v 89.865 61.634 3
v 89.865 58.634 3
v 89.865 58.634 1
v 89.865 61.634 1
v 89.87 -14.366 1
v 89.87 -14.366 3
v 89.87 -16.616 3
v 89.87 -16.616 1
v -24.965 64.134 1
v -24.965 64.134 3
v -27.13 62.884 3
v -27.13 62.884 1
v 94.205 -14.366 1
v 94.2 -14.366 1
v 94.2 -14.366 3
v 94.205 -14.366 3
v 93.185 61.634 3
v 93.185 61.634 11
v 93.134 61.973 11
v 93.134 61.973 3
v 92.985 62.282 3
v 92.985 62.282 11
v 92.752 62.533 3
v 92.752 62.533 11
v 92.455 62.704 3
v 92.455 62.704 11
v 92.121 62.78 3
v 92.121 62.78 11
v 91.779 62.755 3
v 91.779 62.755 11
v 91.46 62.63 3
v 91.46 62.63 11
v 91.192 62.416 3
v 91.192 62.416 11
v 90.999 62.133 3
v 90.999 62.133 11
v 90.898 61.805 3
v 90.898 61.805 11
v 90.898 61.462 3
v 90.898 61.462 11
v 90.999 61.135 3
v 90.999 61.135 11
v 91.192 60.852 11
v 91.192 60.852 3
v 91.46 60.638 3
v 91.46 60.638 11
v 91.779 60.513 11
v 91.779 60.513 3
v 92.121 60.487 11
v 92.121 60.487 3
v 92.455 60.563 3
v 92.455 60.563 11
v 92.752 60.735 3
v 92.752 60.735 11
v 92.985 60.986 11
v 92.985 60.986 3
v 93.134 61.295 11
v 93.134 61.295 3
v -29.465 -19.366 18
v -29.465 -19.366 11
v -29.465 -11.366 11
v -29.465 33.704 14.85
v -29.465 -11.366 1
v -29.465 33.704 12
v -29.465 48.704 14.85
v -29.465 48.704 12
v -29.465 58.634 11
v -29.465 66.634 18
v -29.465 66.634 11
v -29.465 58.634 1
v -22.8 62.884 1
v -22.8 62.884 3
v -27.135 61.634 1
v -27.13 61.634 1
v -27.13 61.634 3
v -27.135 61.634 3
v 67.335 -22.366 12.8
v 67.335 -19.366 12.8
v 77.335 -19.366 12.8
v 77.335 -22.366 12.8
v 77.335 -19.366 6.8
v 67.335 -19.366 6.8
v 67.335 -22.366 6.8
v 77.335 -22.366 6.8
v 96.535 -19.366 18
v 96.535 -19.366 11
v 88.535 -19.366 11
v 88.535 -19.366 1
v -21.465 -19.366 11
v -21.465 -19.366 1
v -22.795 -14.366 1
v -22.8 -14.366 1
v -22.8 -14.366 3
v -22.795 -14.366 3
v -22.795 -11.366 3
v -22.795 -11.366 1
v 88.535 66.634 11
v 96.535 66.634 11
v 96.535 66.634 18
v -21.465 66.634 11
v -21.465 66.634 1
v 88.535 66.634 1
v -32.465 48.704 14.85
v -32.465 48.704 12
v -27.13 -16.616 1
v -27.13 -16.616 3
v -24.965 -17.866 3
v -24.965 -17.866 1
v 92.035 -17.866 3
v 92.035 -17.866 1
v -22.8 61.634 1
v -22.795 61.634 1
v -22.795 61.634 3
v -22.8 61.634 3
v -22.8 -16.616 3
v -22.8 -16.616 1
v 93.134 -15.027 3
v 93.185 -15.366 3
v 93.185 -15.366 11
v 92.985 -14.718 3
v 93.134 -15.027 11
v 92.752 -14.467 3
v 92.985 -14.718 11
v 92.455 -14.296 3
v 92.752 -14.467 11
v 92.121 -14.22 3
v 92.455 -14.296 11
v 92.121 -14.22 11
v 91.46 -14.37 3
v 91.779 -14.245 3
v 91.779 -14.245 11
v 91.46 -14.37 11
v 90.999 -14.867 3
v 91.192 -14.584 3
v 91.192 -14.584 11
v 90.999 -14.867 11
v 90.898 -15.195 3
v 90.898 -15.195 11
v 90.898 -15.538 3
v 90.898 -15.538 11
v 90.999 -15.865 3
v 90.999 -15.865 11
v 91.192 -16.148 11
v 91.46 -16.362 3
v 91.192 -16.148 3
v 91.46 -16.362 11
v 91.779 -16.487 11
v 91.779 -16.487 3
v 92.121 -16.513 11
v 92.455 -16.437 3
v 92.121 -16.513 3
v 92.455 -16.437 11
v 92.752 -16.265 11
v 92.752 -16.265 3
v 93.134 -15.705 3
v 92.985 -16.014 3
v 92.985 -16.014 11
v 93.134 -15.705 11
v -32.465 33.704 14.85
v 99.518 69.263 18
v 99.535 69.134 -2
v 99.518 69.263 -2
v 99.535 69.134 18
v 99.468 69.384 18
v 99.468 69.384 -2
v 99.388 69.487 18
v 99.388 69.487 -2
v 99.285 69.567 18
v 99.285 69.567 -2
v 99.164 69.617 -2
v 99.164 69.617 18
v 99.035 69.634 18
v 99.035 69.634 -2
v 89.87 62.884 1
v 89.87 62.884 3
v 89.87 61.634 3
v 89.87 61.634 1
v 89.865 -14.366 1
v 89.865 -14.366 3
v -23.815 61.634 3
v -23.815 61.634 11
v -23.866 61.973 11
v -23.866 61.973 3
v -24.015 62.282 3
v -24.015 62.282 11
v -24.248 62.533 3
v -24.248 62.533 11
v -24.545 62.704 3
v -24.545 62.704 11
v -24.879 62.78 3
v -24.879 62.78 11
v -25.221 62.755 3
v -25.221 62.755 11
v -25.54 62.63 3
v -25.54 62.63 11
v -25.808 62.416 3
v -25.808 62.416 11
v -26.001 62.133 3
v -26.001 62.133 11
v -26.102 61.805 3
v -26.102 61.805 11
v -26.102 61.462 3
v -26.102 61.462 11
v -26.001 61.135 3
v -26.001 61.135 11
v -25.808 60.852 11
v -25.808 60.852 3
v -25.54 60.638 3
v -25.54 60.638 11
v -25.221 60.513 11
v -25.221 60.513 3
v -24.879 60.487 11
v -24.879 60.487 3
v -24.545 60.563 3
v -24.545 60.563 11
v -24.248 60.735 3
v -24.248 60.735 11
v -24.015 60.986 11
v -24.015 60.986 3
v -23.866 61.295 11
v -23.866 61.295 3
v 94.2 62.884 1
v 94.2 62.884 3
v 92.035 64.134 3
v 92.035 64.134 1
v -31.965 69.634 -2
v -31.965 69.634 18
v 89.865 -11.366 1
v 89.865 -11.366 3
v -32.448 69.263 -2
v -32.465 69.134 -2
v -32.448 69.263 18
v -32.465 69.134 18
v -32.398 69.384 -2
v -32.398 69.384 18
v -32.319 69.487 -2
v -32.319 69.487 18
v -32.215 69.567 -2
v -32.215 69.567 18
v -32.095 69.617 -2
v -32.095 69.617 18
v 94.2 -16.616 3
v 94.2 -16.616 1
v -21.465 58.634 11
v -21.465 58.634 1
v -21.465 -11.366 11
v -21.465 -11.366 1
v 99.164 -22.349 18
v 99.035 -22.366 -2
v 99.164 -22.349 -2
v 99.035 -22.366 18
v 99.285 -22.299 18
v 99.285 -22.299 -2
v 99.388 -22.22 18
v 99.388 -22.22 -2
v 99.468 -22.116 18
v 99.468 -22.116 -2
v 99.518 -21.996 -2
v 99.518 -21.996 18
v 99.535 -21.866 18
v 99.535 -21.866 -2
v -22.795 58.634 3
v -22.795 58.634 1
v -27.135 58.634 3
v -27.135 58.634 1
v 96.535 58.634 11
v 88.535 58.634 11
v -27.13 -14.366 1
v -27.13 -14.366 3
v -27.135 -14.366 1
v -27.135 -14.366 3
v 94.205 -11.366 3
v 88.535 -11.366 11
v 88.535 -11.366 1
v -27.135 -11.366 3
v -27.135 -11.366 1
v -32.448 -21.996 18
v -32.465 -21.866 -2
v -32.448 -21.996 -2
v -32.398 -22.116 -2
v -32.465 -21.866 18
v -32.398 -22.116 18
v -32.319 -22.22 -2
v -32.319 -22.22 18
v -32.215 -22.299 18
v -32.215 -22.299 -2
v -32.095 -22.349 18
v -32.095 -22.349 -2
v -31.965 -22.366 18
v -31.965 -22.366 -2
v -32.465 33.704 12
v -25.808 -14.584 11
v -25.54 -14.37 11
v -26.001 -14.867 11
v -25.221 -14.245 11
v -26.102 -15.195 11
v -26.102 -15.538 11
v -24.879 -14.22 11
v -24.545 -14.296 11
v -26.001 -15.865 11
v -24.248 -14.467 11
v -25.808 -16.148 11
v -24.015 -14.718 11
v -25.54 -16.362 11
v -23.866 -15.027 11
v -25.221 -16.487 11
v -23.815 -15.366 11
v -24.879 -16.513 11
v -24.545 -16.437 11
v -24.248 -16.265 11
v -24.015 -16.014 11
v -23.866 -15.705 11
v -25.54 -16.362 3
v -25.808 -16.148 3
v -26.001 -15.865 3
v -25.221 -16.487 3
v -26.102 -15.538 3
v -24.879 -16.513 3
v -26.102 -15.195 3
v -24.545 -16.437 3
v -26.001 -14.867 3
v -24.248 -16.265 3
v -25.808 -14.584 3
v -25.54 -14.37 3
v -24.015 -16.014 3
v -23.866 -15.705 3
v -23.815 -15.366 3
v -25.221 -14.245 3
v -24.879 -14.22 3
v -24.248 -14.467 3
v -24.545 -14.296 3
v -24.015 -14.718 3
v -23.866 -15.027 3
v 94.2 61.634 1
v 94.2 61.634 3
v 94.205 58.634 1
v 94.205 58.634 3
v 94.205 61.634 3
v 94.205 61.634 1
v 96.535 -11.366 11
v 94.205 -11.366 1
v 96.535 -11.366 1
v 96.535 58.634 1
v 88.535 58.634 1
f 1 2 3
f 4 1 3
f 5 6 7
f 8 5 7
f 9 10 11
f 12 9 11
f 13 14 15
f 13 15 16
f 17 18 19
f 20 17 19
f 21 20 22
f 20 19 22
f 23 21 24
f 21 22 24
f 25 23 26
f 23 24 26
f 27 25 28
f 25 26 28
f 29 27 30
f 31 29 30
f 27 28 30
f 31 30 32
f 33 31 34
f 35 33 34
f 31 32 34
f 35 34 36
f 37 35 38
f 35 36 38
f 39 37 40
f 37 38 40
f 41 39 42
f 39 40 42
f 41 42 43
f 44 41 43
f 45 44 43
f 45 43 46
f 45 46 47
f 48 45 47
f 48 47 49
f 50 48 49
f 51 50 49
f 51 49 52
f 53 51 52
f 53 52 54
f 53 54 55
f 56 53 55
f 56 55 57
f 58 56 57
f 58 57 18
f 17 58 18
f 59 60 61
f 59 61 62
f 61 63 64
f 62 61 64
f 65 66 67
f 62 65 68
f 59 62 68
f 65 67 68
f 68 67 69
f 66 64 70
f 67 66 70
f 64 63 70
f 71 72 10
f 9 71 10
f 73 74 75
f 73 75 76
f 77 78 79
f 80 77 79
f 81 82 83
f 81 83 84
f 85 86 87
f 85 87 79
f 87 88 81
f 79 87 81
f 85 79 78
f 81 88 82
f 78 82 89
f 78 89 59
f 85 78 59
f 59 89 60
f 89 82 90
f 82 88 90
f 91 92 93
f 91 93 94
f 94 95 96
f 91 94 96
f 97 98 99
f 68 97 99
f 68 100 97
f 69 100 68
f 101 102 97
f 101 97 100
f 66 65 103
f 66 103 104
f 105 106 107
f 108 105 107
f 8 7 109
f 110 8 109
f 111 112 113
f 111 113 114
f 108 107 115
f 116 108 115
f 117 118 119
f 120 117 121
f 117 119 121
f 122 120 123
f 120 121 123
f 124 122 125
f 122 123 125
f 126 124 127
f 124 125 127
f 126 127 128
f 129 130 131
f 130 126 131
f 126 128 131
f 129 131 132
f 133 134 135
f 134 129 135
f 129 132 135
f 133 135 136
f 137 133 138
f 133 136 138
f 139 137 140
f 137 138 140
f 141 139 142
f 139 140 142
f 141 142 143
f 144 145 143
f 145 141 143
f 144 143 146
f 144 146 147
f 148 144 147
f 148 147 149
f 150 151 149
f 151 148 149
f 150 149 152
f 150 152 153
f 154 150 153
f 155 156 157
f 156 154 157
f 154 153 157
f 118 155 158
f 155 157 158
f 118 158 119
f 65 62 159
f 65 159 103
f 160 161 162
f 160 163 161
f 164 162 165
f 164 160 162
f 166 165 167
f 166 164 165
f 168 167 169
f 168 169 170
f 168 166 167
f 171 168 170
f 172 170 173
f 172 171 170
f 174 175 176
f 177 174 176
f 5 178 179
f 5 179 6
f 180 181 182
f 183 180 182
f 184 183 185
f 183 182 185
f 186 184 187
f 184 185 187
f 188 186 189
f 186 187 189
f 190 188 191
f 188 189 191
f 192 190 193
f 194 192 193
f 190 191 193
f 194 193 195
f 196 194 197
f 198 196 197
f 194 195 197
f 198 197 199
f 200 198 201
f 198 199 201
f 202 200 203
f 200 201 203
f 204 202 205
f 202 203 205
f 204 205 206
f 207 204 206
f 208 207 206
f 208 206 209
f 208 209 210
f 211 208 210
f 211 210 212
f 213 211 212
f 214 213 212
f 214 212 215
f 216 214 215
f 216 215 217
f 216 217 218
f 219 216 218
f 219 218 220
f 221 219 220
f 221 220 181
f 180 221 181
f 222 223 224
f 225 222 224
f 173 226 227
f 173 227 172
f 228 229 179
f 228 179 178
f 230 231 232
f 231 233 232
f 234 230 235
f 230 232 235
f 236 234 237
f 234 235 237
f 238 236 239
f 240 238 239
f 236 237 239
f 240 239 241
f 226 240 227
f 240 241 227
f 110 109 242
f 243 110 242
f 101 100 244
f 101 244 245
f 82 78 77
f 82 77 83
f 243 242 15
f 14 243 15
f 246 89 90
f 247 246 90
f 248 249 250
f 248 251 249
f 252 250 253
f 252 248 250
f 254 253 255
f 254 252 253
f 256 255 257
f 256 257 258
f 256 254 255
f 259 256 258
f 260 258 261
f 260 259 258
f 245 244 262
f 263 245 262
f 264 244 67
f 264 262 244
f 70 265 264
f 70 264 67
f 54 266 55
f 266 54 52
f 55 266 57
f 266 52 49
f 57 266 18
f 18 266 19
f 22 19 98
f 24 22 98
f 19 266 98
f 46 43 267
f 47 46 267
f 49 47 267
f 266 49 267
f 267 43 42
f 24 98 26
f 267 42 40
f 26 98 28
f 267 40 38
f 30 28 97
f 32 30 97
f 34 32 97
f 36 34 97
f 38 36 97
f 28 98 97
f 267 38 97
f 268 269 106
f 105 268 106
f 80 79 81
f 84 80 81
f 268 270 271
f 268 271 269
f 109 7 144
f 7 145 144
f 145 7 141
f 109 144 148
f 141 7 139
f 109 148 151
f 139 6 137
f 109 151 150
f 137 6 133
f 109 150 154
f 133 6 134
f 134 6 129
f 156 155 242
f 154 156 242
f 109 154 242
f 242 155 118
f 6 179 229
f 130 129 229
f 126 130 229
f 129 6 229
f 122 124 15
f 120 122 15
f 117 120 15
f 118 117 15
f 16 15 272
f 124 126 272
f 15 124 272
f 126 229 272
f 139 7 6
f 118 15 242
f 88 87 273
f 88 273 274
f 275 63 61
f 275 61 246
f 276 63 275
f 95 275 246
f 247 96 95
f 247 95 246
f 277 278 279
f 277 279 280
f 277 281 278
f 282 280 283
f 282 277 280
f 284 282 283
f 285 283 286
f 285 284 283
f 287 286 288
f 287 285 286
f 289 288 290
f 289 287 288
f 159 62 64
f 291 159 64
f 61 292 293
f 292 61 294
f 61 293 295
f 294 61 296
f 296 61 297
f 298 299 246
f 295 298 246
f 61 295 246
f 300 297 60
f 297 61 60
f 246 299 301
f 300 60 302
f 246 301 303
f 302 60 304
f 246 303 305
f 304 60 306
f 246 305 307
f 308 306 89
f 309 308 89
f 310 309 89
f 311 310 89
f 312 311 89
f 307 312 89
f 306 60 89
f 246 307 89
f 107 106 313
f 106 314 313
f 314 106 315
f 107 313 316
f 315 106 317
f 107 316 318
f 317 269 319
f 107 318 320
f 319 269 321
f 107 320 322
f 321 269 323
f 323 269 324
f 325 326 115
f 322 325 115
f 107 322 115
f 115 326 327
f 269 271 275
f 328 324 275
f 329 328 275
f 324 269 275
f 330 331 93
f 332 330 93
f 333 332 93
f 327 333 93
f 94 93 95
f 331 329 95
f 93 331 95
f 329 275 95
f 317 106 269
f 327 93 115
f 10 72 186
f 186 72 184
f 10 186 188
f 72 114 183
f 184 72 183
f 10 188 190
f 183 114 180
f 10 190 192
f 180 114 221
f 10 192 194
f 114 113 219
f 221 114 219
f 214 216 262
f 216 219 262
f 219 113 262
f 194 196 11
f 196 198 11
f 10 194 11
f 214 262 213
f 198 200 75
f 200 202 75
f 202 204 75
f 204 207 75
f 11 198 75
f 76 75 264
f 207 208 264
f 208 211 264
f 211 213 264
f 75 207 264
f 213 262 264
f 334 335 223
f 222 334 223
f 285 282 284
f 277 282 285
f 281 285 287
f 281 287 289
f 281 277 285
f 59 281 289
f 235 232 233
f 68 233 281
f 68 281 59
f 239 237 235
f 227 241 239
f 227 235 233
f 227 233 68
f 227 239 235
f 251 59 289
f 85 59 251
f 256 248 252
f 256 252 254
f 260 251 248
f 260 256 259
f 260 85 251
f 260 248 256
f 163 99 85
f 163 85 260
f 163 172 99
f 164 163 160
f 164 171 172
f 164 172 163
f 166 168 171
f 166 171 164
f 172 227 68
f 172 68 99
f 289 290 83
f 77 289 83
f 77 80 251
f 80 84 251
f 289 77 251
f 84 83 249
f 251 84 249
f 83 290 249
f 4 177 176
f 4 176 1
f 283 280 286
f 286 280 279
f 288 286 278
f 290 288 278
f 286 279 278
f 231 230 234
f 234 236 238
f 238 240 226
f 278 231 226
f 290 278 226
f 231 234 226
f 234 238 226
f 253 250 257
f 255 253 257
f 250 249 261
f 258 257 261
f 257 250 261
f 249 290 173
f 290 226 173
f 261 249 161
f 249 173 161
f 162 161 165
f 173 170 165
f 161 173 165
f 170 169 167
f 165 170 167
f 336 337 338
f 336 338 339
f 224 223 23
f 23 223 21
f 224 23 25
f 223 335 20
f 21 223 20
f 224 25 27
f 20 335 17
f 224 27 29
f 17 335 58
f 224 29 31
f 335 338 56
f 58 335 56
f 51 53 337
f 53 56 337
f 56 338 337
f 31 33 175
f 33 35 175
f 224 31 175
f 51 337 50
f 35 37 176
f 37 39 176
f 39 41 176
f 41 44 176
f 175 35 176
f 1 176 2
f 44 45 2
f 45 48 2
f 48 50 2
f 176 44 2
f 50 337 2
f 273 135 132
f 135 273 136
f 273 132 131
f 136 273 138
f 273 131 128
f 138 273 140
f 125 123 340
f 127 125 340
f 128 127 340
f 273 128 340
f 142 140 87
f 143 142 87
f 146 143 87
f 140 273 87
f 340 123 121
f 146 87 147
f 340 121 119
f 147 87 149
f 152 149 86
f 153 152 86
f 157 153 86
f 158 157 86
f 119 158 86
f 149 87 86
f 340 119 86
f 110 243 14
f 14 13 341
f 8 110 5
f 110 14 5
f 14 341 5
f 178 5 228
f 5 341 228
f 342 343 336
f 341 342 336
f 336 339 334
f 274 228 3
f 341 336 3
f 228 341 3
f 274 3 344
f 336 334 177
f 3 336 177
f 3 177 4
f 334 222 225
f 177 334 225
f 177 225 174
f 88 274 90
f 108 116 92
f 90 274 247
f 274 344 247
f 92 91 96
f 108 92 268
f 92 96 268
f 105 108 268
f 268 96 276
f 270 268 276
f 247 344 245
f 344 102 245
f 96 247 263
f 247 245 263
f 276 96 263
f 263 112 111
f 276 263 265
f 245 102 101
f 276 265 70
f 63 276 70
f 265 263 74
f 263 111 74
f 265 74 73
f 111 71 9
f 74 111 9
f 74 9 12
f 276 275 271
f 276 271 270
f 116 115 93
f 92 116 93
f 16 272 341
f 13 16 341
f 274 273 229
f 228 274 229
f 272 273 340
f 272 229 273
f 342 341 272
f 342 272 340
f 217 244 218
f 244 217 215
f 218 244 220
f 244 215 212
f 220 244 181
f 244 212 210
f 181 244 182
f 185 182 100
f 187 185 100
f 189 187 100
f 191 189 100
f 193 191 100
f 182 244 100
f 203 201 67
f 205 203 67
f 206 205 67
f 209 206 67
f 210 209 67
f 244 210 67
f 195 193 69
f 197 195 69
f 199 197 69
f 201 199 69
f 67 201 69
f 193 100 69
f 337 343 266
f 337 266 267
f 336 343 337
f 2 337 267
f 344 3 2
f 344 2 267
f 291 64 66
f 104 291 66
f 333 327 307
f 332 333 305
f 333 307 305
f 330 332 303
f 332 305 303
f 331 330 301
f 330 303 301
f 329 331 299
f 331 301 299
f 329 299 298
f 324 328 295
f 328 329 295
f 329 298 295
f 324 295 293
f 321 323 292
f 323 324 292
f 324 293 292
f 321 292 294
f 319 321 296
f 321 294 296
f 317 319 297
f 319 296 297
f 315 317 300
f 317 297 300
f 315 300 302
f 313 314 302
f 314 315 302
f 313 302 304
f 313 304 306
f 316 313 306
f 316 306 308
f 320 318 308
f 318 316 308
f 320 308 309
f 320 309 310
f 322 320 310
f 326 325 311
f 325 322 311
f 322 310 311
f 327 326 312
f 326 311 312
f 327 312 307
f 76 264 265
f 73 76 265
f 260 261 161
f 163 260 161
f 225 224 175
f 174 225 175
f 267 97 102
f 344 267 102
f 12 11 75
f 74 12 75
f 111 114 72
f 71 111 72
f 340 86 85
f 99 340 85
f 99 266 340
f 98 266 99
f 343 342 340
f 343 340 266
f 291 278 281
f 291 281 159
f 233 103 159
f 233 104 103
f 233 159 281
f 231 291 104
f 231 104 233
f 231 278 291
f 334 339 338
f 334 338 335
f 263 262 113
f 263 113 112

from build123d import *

# Parameters (mm, degrees)
BOSS_EXTRU_1_DEPTH       = 18
BOSS_EXTRU_1_DEPTH_BACK  = 2
ESQUISSE1_W              = 132
ESQUISSE1_H              = 92
ENL_V_START              = -3
ESQUISSE14_W             = 126
ESQUISSE14_H             = 86
ENL_V_MAT_EXTRU_1_DEPTH  = 121.109755351
ESQUISSE15_W             = 8
ESQUISSE15_H             = 10
BOSS_EXTRU_2_DEPTH       = 8
ESQUISSE16_W             = 8
ESQUISSE16_H             = 10
BOSS_EXTRU_3_DEPTH       = 8
ESQUISSE17_W             = 8
ESQUISSE17_H             = 10
BOSS_EXTRU_4_DEPTH       = 8
ESQUISSE18_W             = 8
ESQUISSE18_H             = 10
BOSS_EXTRU_5_DEPTH       = 8
ESQUISSE19_R             = 1.15
ENL_V_MAT_EXTRU_2_DEPTH  = 10
ESQUISSE20_R             = 1.15
ENL_V_MAT_EXTRU_3_DEPTH  = 10
ESQUISSE21_R             = 1.15
ENL_V_MAT_EXTRU_4_DEPTH  = 10
ESQUISSE22_R             = 1.15
ENL_V_MAT_EXTRU_5_DEPTH  = 10
ENL_V_START_2            = -8
ENL_V_MAT_EXTRU_6_DEPTH  = 2
ESQUISSE24_W             = 4.34
ESQUISSE24_H             = 2
ENL_V_MAT_EXTRU_7_DEPTH  = 3
ENL_V_MAT_EXTRU_8_DEPTH  = 2
ESQUISSE26_W             = 4.34
ESQUISSE26_H             = 2
ENL_V_MAT_EXTRU_9_DEPTH  = 3
ENL_V_MAT_EXTRU_10_DEPTH = 2
ESQUISSE28_W             = 4.34
ESQUISSE28_H             = 2
ENL_V_MAT_EXTRU_11_DEPTH = 3
ENL_V_MAT_EXTRU_12_DEPTH = 2
ESQUISSE30_W             = 4.34
ESQUISSE30_H             = 2
ENL_V_MAT_EXTRU_13_DEPTH = 3
ESQUISSE31_W             = 10
ESQUISSE31_H             = 6
ENL_V_MAT_EXTRU_14_DEPTH = 3
ESQUISSE32_W             = 2.85
ESQUISSE32_H             = 15
ENL_V_MAT_EXTRU_15_DEPTH = 3
CONG_1_R                 = 0.5
CONG_2_R                 = 0.5
CONG_3_R                 = 0.5
CONG_4_R                 = 0.5


with BuildPart() as part:
    # Esquisse1 → Boss.-Extru.1 (new, two sides: drawn at the far end of the back side and taken through both)
    with BuildSketch(Plane.XY.offset(-BOSS_EXTRU_1_DEPTH_BACK)):
        with Locations((33.534709402, 23.633709415)):
            Rectangle(ESQUISSE1_W, ESQUISSE1_H)
    extrude(amount=BOSS_EXTRU_1_DEPTH + BOSS_EXTRU_1_DEPTH_BACK)

    # Esquisse14 → Enlèv. mat.-Extru.1 (cut, through all)
    with BuildSketch(Plane(origin=(0, 0, -2), x_dir=(-1, 0, 0), z_dir=(0, 0, -1)).offset(ENL_V_START)):
        with Locations((-33.534709402, 23.633709415)):
            Rectangle(ESQUISSE14_W, ESQUISSE14_H)
    extrude(amount=-ENL_V_MAT_EXTRU_1_DEPTH, mode=Mode.SUBTRACT)

    # Esquisse15 → Boss.-Extru.2 (add)
    with BuildSketch(Plane(origin=(0, 66.633709415, 0), x_dir=(-1, 0, 0), z_dir=(0, -1, 0))):
        with Locations((25.465290598, -6)):
            Rectangle(ESQUISSE15_W, ESQUISSE15_H)
    extrude(amount=BOSS_EXTRU_2_DEPTH)

    # Esquisse16 → Boss.-Extru.3 (add)
    with BuildSketch(Plane(origin=(0, 66.633709415, 0), x_dir=(-1, 0, 0), z_dir=(0, -1, 0))):
        with Locations((-92.534709402, -6)):
            Rectangle(ESQUISSE16_W, ESQUISSE16_H)
    extrude(amount=BOSS_EXTRU_3_DEPTH)

    # Esquisse17 → Boss.-Extru.4 (add)
    with BuildSketch(Plane(origin=(0, -19.366290585, 0), x_dir=(1, 0, 0), z_dir=(0, 1, 0))):
        with Locations((92.534709402, -6)):
            Rectangle(ESQUISSE17_W, ESQUISSE17_H)
    extrude(amount=BOSS_EXTRU_4_DEPTH)

    # Esquisse18 → Boss.-Extru.5 (add)
    with BuildSketch(Plane(origin=(0, -19.366290585, 0), x_dir=(1, 0, 0), z_dir=(0, 1, 0))):
        with Locations((-25.465290598, -6)):
            Rectangle(ESQUISSE18_W, ESQUISSE18_H)
    extrude(amount=BOSS_EXTRU_5_DEPTH)

    # Esquisse19 → Enlèv. mat.-Extru.2 (cut)
    with BuildSketch(Plane.XY.offset(11)):
        with Locations((92.034709402, -15.366290585)):
            Circle(ESQUISSE19_R)
    extrude(amount=-ENL_V_MAT_EXTRU_2_DEPTH, mode=Mode.SUBTRACT)

    # Esquisse20 → Enlèv. mat.-Extru.3 (cut)
    with BuildSketch(Plane.XY.offset(11)):
        with Locations((-24.965290598, -15.366290585)):
            Circle(ESQUISSE20_R)
    extrude(amount=-ENL_V_MAT_EXTRU_3_DEPTH, mode=Mode.SUBTRACT)

    # Esquisse21 → Enlèv. mat.-Extru.4 (cut)
    with BuildSketch(Plane.XY.offset(11)):
        with Locations((-24.965290598, 61.633709415)):
            Circle(ESQUISSE21_R)
    extrude(amount=-ENL_V_MAT_EXTRU_4_DEPTH, mode=Mode.SUBTRACT)

    # Esquisse22 → Enlèv. mat.-Extru.5 (cut)
    with BuildSketch(Plane.XY.offset(11)):
        with Locations((92.034709402, 61.633709415)):
            Circle(ESQUISSE22_R)
    extrude(amount=-ENL_V_MAT_EXTRU_5_DEPTH, mode=Mode.SUBTRACT)

    # Esquisse23 → Enlèv. mat.-Extru.6 (cut)
    with BuildSketch(Plane.XY.offset(11).offset(ENL_V_START_2)):
        Polygon((89.869645893, -14.116290585), (89.869645893, -16.616290585), (92.034709402, -17.866290585), (94.199772912, -16.616290585), (94.199772912, -14.116290585), (92.034709402, -12.866290585), align=None)
    extrude(amount=-ENL_V_MAT_EXTRU_6_DEPTH, mode=Mode.SUBTRACT)

    # Esquisse24 → Enlèv. mat.-Extru.7 (cut)
    with BuildSketch(Plane(origin=(0, -11.366290585, 0), x_dir=(1, 0, 0), z_dir=(0, 1, 0))):
        with Locations((92.034709402, -2)):
            Rectangle(ESQUISSE24_W, ESQUISSE24_H)
    extrude(amount=-ENL_V_MAT_EXTRU_7_DEPTH, mode=Mode.SUBTRACT)

    # Esquisse25 → Enlèv. mat.-Extru.8 (cut)
    with BuildSketch(Plane.XY.offset(11).offset(ENL_V_START_2)):
        Polygon((-22.800227088, -14.116290585), (-24.965290598, -12.866290585), (-27.130354107, -14.116290585), (-27.130354107, -16.616290585), (-24.965290598, -17.866290585), (-22.800227088, -16.616290585), align=None)
    extrude(amount=-ENL_V_MAT_EXTRU_8_DEPTH, mode=Mode.SUBTRACT)

    # Esquisse26 → Enlèv. mat.-Extru.9 (cut)
    with BuildSketch(Plane(origin=(0, -11.366290585, 0), x_dir=(1, 0, 0), z_dir=(0, 1, 0))):
        with Locations((-24.965290598, -2)):
            Rectangle(ESQUISSE26_W, ESQUISSE26_H)
    extrude(amount=-ENL_V_MAT_EXTRU_9_DEPTH, mode=Mode.SUBTRACT)

    # Esquisse27 → Enlèv. mat.-Extru.10 (cut)
    with BuildSketch(Plane.XY.offset(11).offset(ENL_V_START_2)):
        Polygon((-24.965290598, 59.133709415), (-22.800227088, 60.383709415), (-22.800227088, 62.883709415), (-24.965290598, 64.133709415), (-27.130354107, 62.883709415), (-27.130354107, 60.383709415), align=None)
    extrude(amount=-ENL_V_MAT_EXTRU_10_DEPTH, mode=Mode.SUBTRACT)

    # Esquisse28 → Enlèv. mat.-Extru.11 (cut)
    with BuildSketch(Plane(origin=(0, 58.633709415, 0), x_dir=(-1, 0, 0), z_dir=(0, -1, 0))):
        with Locations((24.965290598, -2)):
            Rectangle(ESQUISSE28_W, ESQUISSE28_H)
    extrude(amount=-ENL_V_MAT_EXTRU_11_DEPTH, mode=Mode.SUBTRACT)

    # Esquisse29 → Enlèv. mat.-Extru.12 (cut)
    with BuildSketch(Plane.XY.offset(11).offset(ENL_V_START_2)):
        Polygon((89.869645893, 60.383709415), (92.034709402, 59.133709415), (94.199772912, 60.383709415), (94.199772912, 62.883709415), (92.034709402, 64.133709415), (89.869645893, 62.883709415), align=None)
    extrude(amount=-ENL_V_MAT_EXTRU_12_DEPTH, mode=Mode.SUBTRACT)

    # Esquisse30 → Enlèv. mat.-Extru.13 (cut)
    with BuildSketch(Plane(origin=(0, 58.633709415, 0), x_dir=(-1, 0, 0), z_dir=(0, -1, 0))):
        with Locations((-92.034709402, -2)):
            Rectangle(ESQUISSE30_W, ESQUISSE30_H)
    extrude(amount=-ENL_V_MAT_EXTRU_13_DEPTH, mode=Mode.SUBTRACT)

    # Esquisse31 → Enlèv. mat.-Extru.14 (cut)
    with BuildSketch(Plane(origin=(0, -19.366290585, 0), x_dir=(1, 0, 0), z_dir=(0, 1, 0))):
        with Locations((72.334709402, -9.8)):
            Rectangle(ESQUISSE31_W, ESQUISSE31_H)
    extrude(amount=-ENL_V_MAT_EXTRU_14_DEPTH, mode=Mode.SUBTRACT)

    # Esquisse32 → Enlèv. mat.-Extru.15 (cut)
    with BuildSketch(Plane(origin=(-29.465290598, 0, 0), x_dir=(0, 0, -1), z_dir=(1, 0, 0))):
        with Locations((-13.425, 41.203709415)):
            Rectangle(ESQUISSE32_W, ESQUISSE32_H)
    extrude(amount=-ENL_V_MAT_EXTRU_15_DEPTH, mode=Mode.SUBTRACT)

    # Congé1
    cong_1_edges = [part.edges().sort_by_distance(p)[0] for p in [
        (-32.465290598, 69.633709415, 8),
    ]]
    fillet(cong_1_edges, radius=CONG_1_R)

    # Congé2
    cong_2_edges = [part.edges().sort_by_distance(p)[0] for p in [
        (-32.465290598, -22.366290585, 8),
    ]]
    fillet(cong_2_edges, radius=CONG_2_R)

    # Congé3
    cong_3_edges = [part.edges().sort_by_distance(p)[0] for p in [
        (99.534709402, -22.366290585, 8),
    ]]
    fillet(cong_3_edges, radius=CONG_3_R)

    # Congé4
    cong_4_edges = [part.edges().sort_by_distance(p)[0] for p in [
        (99.534709402, 69.633709415, 8),
    ]]
    fillet(cong_4_edges, radius=CONG_4_R)


solid = part.part
